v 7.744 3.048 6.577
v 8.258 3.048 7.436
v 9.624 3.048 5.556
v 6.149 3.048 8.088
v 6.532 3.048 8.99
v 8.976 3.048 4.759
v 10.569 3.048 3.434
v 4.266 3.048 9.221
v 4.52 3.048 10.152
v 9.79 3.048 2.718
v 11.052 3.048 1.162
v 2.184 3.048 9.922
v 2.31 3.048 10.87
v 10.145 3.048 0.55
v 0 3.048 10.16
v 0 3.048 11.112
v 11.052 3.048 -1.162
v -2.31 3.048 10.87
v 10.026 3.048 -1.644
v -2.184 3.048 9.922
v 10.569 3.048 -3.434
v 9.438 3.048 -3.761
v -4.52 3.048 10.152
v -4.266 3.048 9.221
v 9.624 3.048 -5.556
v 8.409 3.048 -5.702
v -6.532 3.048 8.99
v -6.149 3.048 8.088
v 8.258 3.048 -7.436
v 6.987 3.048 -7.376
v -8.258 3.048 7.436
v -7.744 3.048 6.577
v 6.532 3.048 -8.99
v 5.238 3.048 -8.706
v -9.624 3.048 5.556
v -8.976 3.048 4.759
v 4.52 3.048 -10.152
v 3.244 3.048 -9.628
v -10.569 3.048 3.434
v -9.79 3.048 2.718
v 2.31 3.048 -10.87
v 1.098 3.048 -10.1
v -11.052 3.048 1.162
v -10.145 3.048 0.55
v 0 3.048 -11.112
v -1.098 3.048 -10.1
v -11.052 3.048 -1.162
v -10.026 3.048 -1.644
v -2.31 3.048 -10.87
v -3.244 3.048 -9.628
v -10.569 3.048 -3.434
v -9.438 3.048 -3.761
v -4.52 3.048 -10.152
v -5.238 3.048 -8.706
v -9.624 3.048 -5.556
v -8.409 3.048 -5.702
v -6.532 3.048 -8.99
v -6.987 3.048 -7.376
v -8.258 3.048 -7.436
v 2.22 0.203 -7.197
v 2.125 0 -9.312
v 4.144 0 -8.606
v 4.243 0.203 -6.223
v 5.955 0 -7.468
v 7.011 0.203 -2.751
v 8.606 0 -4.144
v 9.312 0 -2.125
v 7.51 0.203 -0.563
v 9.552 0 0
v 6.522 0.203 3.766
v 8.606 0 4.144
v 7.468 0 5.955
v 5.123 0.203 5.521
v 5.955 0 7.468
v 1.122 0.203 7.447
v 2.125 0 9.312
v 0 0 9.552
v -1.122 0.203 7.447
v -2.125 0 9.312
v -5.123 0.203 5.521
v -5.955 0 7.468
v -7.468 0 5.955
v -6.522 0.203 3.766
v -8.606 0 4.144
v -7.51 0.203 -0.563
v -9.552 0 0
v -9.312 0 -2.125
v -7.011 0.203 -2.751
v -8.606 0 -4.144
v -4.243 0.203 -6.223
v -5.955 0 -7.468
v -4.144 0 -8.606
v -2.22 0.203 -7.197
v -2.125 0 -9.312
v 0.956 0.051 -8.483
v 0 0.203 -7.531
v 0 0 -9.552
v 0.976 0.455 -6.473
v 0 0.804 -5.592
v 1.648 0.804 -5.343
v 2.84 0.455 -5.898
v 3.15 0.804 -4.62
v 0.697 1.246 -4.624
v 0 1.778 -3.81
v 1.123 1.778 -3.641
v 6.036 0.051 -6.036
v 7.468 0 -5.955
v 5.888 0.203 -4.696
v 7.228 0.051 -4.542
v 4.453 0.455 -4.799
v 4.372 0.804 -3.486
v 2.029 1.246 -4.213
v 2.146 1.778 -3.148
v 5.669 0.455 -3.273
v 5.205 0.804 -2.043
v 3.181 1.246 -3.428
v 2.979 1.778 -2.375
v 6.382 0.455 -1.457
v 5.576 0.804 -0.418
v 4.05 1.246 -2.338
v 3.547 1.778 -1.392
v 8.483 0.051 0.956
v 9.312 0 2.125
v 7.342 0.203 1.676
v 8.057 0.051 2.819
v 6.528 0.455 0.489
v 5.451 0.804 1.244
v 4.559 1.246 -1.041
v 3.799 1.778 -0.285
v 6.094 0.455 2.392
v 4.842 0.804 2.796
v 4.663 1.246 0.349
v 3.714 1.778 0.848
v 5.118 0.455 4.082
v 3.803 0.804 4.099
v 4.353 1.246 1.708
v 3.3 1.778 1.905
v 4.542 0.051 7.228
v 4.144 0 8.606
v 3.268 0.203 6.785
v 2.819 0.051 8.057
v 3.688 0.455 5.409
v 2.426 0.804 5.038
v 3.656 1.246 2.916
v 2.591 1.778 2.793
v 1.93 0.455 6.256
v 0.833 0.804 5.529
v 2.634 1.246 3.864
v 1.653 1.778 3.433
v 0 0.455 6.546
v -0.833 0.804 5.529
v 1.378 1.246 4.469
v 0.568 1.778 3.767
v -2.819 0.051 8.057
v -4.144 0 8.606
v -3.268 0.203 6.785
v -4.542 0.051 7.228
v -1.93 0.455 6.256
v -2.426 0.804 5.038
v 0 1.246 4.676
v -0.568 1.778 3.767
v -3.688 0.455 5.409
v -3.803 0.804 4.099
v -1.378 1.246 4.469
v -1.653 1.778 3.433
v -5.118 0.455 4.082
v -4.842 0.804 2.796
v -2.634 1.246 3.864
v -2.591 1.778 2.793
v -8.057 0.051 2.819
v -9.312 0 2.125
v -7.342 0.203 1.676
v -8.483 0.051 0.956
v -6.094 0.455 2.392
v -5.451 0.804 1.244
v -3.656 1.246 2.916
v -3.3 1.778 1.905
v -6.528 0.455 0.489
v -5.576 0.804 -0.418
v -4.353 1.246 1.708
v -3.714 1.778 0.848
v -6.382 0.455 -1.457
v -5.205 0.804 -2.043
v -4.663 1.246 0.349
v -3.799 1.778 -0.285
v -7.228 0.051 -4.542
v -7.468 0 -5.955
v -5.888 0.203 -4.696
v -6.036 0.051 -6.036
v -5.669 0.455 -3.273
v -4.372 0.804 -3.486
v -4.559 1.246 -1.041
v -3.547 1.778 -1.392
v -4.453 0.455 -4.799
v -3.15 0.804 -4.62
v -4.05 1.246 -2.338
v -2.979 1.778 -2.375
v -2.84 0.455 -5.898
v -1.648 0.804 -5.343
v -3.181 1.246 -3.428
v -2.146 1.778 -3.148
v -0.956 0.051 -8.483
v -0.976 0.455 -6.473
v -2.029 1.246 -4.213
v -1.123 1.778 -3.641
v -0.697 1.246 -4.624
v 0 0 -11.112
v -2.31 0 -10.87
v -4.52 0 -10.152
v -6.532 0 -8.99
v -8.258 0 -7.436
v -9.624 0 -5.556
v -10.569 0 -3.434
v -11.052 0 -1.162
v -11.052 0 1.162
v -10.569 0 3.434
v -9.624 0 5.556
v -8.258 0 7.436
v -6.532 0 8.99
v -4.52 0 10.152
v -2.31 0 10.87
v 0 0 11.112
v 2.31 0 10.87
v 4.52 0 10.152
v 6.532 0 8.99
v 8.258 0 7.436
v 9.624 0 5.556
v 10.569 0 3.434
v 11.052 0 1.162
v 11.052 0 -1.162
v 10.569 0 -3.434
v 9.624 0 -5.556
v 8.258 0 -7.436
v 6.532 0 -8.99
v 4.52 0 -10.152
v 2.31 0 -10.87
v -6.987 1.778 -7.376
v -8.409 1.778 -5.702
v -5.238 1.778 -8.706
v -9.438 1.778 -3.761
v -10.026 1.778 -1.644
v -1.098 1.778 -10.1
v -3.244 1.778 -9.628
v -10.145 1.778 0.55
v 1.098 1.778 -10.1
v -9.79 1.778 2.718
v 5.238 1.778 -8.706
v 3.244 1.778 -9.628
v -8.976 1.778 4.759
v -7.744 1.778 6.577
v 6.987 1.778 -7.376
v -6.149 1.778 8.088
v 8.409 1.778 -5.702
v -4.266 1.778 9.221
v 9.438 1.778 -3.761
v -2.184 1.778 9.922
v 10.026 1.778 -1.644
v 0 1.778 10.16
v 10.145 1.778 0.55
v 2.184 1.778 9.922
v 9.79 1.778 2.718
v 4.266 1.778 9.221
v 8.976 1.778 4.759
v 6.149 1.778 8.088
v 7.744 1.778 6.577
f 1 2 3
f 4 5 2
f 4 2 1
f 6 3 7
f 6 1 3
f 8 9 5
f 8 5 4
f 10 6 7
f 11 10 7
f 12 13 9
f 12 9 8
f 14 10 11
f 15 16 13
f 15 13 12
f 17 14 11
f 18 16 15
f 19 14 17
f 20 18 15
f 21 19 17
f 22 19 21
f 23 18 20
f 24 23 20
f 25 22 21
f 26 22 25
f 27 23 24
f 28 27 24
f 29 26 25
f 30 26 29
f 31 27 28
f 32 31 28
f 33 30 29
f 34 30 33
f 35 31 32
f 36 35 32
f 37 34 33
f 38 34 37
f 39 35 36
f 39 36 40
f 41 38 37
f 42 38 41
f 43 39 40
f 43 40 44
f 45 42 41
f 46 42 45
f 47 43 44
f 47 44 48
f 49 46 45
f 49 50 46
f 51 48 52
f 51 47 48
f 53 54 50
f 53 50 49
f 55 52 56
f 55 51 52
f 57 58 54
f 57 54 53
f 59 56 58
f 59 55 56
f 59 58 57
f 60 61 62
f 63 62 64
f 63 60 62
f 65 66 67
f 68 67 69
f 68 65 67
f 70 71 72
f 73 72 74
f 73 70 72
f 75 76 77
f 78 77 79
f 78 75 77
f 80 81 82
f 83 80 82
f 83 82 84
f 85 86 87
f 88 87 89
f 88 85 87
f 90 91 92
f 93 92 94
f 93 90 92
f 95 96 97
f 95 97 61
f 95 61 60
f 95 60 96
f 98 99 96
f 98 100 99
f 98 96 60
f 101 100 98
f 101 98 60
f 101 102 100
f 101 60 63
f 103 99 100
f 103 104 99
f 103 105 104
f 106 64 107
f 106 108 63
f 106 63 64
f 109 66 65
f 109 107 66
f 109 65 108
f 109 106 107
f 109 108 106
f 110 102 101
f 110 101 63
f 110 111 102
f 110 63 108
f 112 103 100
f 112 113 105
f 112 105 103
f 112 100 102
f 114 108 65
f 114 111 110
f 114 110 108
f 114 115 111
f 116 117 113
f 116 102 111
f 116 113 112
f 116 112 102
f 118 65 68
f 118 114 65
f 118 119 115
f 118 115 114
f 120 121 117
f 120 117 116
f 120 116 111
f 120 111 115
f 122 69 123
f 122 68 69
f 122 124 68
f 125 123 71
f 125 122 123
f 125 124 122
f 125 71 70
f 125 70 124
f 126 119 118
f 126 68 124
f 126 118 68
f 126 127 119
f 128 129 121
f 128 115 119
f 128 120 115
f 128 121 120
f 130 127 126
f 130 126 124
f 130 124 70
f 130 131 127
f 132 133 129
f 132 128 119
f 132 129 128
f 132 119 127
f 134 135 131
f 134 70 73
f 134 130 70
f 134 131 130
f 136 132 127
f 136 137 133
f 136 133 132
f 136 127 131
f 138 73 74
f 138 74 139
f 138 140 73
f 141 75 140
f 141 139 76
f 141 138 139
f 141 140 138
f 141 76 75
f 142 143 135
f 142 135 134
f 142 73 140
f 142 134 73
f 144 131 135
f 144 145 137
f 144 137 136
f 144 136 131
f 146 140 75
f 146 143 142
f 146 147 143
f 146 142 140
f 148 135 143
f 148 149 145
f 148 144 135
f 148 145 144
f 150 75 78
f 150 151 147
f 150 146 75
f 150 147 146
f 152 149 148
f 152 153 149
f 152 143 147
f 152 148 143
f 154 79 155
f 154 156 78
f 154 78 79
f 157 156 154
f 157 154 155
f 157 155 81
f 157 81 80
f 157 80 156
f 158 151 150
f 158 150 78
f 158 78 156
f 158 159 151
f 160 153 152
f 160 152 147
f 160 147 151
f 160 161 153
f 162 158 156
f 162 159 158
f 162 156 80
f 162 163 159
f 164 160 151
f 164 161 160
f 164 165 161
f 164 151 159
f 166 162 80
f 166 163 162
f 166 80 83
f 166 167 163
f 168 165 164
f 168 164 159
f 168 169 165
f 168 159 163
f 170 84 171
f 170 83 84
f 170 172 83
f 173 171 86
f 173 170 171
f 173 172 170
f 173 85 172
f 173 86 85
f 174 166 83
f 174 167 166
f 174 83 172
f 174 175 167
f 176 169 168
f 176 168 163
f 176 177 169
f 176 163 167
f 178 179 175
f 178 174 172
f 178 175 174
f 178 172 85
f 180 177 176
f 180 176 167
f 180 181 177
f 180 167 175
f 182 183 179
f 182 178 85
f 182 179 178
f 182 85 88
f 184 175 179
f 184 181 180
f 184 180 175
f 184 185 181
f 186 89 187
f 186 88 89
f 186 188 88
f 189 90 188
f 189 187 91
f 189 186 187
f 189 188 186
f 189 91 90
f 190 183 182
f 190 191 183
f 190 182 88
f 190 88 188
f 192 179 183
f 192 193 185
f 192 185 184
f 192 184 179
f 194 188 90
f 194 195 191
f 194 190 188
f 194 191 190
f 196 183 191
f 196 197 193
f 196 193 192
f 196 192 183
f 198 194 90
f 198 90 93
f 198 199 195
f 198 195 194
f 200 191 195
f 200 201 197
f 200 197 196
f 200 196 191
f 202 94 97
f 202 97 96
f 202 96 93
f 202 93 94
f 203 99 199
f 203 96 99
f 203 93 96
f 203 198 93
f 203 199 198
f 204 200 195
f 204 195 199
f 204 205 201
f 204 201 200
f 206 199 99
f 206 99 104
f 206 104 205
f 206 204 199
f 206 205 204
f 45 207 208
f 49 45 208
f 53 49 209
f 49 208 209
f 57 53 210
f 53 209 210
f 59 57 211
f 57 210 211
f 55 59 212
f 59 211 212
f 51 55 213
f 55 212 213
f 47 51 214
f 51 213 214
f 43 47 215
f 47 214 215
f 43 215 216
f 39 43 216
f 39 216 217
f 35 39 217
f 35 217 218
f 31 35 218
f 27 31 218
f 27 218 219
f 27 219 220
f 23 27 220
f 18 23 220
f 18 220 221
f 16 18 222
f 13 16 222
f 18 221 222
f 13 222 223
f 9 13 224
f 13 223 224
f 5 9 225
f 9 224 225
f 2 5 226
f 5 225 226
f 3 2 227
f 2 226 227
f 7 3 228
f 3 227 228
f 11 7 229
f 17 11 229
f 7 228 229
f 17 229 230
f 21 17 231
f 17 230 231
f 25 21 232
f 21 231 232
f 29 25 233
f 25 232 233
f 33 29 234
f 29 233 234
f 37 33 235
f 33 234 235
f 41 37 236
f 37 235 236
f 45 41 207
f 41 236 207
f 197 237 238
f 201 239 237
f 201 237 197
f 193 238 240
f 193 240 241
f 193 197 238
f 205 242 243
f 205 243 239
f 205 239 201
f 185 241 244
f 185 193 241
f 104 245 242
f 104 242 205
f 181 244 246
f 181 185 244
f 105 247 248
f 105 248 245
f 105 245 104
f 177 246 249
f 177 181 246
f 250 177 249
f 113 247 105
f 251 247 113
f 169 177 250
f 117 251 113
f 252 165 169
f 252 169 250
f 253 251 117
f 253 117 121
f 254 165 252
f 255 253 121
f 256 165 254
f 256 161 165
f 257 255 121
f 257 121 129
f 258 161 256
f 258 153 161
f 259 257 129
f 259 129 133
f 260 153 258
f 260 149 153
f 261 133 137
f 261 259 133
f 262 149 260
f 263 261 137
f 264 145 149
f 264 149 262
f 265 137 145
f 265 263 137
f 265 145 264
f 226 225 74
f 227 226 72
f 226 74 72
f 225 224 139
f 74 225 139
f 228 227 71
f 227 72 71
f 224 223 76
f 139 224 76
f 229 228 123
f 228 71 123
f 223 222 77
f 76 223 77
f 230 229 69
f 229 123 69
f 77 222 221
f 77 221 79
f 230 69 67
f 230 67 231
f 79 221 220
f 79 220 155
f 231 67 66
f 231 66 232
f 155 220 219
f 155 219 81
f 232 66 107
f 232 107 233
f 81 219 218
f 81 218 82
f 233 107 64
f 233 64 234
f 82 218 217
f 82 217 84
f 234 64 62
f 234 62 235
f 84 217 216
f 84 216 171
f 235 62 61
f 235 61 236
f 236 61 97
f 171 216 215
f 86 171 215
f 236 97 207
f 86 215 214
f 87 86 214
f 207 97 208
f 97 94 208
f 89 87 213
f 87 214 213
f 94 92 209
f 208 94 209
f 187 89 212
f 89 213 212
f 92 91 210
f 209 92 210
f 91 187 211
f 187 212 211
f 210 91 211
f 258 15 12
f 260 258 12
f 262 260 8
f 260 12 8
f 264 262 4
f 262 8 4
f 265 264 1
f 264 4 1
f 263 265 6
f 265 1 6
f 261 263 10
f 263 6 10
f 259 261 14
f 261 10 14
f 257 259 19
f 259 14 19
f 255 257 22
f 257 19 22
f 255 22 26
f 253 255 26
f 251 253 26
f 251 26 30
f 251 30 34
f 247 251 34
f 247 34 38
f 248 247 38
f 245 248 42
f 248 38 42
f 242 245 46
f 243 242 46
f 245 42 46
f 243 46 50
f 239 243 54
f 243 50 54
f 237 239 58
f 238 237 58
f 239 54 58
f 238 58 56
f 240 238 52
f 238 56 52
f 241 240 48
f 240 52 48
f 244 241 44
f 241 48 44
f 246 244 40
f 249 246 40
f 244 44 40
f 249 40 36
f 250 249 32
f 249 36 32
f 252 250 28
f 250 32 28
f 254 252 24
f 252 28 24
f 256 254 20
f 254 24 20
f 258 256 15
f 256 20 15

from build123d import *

# Parameters (mm, degrees)
SKETCH2_R           = 11.1125
BOSS_EXTRUDE1_DEPTH = 3.048
SKETCH3_R           = 10.16
CUT_EXTRUDE1_DEPTH  = 1.27
SKETCH4_R           = 3.81
CUT_EXTRUDE2_DEPTH  = 2.54
FILLET1_R           = 10.16


with BuildPart() as part:
    # Sketch2 → Boss-Extrude1 (new body)
    with BuildSketch(Plane(origin=(0, 0, 0), x_dir=(1, 0, 0), z_dir=(0, 1, 0))):
        with Locations(Location((0, 0, 0), (0, 0, 90))):
            Circle(SKETCH2_R)
    extrude(amount=BOSS_EXTRUDE1_DEPTH)

    # Sketch3 → Cut-Extrude1 (cut)
    with BuildSketch(Plane(origin=(0, 3.048, 0), x_dir=(1, 0, 0), z_dir=(0, 1, 0))):
        with Locations(Location((0, 0, 0), (0, 0, 270))):
            Circle(SKETCH3_R)
    extrude(amount=-CUT_EXTRUDE1_DEPTH, mode=Mode.SUBTRACT)

    # Sketch4 → Cut-Extrude2 (cut)
    with BuildSketch(Plane(origin=(0, 0, 0), x_dir=(-1, 0, 0), z_dir=(0, -1, 0))):
        with Locations(Location((0, 0, 0), (0, 0, 90))):
            Circle(SKETCH4_R)
    extrude(amount=-CUT_EXTRUDE2_DEPTH, mode=Mode.SUBTRACT)

    # Fillet1
    # the kernel refuses this fillet: 10.16 mm, written as the material it takes off along each edge
    with BuildSketch(Plane(origin=(0, 0, 0), x_dir=(0, 0, -1), z_dir=(-1, 0, 0))) as fillet1_piece_1:
        with BuildLine():
            CenterArc((9.551748514, -10.16), FILLET1_R, 90, 34.41150867)
            Line((3.81, -1.778), (3.81, 0))
            Line((3.81, 0), (9.551748514, 0))
        make_face()
    revolve(axis=Axis((0, 0, 0), (0, -1, 0)), mode=Mode.SUBTRACT)


solid = part.part
